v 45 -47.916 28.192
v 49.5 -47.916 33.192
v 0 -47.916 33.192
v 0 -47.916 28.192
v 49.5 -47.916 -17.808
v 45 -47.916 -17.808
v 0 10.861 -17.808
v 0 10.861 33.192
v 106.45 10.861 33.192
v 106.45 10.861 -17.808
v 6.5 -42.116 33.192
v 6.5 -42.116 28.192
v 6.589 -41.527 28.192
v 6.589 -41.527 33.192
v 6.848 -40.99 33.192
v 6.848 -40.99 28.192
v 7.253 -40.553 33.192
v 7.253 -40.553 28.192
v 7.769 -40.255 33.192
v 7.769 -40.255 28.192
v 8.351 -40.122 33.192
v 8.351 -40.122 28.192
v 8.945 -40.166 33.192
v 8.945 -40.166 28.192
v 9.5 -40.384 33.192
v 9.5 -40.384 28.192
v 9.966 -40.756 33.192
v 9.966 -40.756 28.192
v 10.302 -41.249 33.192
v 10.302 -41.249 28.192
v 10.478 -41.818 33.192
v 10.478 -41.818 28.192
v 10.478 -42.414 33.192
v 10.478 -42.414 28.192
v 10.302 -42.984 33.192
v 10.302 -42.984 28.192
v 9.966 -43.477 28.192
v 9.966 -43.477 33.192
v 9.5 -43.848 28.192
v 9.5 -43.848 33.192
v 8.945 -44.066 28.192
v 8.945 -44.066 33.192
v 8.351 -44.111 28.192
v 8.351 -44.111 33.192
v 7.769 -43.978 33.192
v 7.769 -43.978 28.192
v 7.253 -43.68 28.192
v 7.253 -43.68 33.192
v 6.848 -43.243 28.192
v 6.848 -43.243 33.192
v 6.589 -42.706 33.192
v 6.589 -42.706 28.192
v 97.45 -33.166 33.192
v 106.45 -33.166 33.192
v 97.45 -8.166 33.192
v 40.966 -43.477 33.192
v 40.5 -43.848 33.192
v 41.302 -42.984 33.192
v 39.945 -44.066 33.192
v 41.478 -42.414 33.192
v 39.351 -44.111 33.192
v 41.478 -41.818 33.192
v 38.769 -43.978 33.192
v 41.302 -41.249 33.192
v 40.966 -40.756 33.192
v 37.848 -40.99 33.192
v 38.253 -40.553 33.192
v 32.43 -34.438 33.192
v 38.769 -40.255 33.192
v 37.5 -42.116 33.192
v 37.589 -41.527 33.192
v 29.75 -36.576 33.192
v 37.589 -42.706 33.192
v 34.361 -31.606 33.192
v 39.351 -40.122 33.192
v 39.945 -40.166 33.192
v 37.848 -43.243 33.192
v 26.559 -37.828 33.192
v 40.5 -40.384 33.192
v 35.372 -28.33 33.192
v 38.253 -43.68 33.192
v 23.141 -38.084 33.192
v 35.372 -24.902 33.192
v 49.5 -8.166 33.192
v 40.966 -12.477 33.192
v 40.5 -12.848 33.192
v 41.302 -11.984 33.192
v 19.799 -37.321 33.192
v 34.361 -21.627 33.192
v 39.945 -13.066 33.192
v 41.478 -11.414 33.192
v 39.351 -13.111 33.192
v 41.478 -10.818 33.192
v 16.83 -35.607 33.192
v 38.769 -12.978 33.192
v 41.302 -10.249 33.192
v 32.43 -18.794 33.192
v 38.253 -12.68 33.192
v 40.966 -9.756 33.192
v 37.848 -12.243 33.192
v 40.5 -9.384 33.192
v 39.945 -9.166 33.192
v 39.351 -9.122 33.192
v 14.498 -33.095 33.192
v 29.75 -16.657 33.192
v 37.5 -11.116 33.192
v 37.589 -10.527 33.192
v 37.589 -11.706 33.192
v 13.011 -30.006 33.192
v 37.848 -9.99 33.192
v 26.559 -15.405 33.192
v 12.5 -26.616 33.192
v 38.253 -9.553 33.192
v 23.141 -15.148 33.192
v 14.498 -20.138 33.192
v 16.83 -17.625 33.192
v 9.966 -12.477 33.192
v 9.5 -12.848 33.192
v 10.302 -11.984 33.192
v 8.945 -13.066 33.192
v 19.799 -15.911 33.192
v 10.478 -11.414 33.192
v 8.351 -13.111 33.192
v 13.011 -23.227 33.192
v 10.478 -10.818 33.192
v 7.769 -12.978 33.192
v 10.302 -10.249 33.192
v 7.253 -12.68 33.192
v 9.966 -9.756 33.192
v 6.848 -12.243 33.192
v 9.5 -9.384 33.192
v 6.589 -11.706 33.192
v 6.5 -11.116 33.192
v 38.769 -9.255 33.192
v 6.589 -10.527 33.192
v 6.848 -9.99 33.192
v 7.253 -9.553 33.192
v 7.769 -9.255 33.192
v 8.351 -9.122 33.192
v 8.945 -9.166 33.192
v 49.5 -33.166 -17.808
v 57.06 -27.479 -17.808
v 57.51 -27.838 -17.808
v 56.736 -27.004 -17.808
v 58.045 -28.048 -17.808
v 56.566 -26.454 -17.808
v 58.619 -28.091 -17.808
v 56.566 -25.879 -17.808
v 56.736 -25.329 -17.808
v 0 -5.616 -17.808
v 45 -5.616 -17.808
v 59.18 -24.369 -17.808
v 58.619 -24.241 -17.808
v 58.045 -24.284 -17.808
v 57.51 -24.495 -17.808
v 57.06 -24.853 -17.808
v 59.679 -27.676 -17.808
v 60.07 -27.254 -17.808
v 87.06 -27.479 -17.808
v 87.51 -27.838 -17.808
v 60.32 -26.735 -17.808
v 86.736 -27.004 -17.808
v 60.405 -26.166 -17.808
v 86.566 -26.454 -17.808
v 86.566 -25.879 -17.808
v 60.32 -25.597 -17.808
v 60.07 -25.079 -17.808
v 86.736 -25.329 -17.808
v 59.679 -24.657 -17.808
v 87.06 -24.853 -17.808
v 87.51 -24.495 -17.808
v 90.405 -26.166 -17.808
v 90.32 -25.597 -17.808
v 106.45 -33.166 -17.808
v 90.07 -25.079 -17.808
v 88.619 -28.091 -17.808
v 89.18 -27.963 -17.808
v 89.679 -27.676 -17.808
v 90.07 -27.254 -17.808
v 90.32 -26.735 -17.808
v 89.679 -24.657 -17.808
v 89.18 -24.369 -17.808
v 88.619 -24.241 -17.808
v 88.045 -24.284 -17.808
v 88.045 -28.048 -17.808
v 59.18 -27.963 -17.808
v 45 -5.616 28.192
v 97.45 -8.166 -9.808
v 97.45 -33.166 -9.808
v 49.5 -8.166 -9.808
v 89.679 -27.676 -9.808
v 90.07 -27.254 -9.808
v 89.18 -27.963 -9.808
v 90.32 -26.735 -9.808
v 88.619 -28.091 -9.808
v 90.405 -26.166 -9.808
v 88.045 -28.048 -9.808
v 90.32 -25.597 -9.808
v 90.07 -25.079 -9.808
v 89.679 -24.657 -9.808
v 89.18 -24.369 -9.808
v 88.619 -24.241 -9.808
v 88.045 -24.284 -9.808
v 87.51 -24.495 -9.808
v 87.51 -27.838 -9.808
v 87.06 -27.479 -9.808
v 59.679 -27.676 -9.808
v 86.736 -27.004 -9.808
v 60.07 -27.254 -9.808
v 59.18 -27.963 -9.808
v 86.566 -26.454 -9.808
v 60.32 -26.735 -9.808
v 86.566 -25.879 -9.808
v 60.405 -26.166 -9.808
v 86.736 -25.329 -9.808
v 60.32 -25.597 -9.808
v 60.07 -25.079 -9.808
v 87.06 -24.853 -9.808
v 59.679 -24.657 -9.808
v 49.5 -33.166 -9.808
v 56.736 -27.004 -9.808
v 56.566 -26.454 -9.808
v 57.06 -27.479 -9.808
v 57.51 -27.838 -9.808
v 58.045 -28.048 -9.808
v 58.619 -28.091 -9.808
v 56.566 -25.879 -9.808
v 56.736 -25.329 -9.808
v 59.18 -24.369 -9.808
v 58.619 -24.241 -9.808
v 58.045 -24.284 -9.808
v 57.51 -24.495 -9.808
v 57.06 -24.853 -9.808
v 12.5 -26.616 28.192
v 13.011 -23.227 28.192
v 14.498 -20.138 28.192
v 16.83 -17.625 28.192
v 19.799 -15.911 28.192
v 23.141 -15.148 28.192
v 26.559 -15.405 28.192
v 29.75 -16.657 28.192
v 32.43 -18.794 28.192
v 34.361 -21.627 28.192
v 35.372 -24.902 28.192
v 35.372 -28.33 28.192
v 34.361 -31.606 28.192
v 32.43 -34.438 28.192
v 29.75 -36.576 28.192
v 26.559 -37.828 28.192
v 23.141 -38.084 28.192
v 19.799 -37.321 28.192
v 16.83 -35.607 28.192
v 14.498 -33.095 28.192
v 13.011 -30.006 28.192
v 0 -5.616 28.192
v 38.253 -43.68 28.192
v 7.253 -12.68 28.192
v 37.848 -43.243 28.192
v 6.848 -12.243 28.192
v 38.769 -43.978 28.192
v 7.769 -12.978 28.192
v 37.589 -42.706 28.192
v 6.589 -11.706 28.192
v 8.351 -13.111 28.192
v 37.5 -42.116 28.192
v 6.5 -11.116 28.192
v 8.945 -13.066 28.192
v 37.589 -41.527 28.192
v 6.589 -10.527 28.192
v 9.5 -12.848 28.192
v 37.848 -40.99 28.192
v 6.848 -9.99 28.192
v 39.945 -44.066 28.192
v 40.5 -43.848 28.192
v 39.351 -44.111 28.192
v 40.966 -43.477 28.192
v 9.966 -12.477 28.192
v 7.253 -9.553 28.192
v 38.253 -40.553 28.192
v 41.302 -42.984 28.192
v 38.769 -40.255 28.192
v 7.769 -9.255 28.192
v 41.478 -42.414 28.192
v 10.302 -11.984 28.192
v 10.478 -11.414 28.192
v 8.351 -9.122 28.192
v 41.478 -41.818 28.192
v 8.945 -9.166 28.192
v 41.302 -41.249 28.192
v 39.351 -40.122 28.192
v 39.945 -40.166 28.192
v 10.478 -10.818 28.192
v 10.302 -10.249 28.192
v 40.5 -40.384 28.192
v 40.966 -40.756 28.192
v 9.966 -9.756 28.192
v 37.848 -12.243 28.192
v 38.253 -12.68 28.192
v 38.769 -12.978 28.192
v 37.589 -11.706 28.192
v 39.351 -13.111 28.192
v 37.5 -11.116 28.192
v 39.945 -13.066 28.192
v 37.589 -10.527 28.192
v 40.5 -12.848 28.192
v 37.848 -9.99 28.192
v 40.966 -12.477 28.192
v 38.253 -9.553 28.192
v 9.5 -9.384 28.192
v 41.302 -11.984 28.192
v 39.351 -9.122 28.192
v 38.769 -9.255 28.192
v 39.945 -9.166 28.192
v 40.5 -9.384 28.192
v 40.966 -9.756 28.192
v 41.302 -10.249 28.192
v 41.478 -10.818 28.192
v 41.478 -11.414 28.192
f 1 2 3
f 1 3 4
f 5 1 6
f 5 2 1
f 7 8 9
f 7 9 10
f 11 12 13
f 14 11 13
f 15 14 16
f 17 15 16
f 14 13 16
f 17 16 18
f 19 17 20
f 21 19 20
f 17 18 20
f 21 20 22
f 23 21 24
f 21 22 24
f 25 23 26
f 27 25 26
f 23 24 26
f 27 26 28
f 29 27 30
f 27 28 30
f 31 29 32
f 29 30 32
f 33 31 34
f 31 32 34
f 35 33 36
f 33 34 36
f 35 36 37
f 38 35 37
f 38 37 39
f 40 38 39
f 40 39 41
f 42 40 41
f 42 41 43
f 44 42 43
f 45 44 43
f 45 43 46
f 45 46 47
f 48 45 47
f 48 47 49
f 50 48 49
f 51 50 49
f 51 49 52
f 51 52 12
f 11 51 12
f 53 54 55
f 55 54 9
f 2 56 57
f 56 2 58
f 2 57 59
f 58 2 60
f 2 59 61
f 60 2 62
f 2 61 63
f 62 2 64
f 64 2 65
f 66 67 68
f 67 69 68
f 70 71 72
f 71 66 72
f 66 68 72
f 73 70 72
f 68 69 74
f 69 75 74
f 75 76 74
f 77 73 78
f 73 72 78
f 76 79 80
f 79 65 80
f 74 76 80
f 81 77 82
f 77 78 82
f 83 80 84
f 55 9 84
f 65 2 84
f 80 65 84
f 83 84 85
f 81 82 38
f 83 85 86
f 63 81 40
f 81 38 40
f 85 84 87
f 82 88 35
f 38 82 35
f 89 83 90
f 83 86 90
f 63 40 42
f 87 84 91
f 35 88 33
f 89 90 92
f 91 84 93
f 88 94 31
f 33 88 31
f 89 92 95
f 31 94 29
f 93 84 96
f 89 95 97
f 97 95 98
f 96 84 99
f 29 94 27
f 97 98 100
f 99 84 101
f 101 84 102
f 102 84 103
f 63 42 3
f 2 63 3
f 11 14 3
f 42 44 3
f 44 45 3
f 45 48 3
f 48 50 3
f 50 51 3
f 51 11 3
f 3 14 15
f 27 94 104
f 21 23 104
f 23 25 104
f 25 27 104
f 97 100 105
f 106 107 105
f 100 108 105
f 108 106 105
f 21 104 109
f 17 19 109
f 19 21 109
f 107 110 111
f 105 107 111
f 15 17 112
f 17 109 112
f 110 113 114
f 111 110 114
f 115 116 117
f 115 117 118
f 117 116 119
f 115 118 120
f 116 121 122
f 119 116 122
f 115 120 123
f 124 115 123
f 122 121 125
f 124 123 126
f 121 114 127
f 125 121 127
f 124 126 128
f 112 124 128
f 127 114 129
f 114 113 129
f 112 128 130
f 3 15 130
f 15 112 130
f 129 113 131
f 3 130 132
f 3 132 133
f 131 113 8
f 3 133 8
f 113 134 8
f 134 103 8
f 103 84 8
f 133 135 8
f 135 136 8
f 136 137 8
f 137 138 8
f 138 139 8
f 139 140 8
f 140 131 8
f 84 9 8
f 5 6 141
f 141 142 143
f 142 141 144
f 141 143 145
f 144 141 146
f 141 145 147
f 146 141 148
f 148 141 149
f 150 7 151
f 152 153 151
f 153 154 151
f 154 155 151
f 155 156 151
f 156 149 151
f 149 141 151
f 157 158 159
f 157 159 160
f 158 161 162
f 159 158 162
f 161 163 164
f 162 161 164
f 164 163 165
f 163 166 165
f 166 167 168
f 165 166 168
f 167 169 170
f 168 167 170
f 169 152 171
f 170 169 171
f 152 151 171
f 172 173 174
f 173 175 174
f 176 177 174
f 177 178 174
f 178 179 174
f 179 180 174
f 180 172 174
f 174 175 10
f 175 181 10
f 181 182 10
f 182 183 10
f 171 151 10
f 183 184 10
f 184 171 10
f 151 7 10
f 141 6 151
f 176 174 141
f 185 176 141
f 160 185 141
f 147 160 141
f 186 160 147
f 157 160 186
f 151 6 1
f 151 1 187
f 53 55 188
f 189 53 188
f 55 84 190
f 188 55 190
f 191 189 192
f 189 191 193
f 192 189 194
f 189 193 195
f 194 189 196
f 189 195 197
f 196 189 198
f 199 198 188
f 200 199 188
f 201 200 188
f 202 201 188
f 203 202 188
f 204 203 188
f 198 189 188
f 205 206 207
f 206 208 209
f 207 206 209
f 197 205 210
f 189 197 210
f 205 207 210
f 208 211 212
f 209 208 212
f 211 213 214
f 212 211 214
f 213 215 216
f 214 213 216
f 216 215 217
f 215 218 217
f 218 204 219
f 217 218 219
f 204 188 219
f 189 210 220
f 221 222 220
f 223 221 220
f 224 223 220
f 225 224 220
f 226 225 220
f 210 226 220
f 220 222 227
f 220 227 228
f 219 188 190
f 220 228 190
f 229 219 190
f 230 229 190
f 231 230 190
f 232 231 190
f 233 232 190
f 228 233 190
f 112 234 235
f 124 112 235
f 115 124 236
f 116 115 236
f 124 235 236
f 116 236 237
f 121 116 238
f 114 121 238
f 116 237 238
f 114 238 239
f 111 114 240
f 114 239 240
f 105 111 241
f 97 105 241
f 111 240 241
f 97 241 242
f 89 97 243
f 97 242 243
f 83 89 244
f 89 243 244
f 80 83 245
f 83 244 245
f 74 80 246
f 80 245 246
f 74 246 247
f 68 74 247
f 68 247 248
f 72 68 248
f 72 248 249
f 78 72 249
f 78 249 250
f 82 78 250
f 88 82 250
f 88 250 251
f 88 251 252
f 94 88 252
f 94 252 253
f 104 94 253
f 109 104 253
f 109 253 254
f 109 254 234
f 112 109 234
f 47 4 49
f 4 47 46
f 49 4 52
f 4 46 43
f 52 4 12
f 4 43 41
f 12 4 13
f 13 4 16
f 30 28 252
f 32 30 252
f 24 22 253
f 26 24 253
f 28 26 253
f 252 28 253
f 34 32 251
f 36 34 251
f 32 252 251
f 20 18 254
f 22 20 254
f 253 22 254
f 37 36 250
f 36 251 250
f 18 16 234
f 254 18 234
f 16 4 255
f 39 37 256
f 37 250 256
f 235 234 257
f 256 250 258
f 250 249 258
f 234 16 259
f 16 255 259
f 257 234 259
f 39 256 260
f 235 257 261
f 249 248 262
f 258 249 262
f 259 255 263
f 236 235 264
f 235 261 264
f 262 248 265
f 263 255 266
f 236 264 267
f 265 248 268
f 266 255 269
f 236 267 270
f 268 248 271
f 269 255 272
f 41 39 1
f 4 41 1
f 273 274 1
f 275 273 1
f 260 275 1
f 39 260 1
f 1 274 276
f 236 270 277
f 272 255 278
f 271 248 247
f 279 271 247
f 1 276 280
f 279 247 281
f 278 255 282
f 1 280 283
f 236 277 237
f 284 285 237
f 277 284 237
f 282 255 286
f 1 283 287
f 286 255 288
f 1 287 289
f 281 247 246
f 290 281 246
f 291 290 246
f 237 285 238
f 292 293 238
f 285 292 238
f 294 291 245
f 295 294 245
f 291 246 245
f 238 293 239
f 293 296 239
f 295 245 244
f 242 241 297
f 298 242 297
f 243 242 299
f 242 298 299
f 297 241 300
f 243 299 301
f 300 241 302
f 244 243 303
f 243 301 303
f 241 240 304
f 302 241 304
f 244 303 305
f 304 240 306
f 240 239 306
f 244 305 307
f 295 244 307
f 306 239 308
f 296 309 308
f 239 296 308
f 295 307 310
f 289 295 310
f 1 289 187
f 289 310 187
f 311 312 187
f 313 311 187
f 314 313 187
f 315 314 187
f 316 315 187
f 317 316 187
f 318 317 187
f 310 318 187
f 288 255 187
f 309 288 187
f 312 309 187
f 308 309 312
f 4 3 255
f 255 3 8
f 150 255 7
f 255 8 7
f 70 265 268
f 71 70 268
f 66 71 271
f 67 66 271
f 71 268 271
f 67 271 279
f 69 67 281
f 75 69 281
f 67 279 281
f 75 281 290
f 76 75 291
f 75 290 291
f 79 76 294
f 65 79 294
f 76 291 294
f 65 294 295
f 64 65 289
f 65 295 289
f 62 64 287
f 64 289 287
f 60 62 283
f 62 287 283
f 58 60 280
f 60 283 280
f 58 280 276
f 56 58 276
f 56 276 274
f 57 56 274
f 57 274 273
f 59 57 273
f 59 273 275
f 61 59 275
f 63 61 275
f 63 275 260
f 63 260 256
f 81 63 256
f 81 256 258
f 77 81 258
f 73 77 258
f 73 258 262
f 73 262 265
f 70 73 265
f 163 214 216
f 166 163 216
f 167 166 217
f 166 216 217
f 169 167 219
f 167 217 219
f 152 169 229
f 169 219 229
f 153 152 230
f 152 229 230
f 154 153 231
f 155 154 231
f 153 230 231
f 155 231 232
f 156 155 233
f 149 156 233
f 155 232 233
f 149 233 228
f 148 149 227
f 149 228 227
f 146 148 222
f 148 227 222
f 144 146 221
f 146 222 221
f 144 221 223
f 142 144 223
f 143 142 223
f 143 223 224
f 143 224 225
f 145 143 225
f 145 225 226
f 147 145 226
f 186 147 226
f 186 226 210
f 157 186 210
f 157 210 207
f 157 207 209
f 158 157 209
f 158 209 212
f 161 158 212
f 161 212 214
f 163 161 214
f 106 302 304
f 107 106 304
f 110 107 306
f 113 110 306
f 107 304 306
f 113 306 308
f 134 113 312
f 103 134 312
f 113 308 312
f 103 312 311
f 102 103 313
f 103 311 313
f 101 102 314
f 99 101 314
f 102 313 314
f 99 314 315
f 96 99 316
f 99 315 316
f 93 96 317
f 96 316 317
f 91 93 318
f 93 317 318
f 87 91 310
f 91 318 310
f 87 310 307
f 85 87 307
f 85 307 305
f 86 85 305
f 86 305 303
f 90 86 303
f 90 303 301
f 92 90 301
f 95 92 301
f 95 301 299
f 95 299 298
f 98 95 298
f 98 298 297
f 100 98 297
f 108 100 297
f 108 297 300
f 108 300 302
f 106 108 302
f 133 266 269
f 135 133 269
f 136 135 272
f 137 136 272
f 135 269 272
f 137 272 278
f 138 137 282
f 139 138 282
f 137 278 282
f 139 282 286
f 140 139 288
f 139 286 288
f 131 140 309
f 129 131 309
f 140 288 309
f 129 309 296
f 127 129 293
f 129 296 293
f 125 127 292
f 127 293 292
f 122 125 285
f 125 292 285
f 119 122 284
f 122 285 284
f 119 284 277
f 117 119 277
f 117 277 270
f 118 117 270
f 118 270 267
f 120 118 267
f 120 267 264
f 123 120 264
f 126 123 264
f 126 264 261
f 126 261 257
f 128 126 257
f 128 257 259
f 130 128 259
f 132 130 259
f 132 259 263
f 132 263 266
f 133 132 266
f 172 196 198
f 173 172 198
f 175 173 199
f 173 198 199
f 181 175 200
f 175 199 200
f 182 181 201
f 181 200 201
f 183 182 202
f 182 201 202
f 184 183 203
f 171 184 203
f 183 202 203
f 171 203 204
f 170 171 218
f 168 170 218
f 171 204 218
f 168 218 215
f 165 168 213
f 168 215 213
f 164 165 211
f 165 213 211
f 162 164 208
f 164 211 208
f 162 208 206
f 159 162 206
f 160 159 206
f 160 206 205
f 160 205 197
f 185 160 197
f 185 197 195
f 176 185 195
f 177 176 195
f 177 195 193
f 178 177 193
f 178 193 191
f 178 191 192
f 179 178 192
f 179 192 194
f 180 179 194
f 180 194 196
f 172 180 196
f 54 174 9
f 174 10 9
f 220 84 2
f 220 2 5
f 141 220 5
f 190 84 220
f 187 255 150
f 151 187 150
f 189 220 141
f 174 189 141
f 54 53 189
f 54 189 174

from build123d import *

# Parameters (mm, degrees)
SKETCH1_W            = 48
SKETCH1_H            = 53
BOSS_EXTRUDE1_DEPTH  = 10
SKETCH2_W            = 48
SKETCH2_H            = 5.616325
BOSS_EXTRUDE2_DEPTH  = 33.1917878
SKETCH4_W            = 4
SKETCH4_H            = 10
BOSS_EXTRUDE4_DEPTH  = 40
SKETCH5_W            = 48
SKETCH5_H            = 10.8609375
BOSS_EXTRUDE5_DEPTH  = 23.1917878
SKETCH6_W            = 48
SKETCH6_H            = 5
BOSS_EXTRUDE6_DEPTH  = 42.3
SKETCH7_W            = 12.8082122
SKETCH7_H            = 16.4772625
BOSS_EXTRUDE7_DEPTH  = 48
CUT_EXTRUDE1_REACH   = 84.426
SKETCH8_R            = 11.5
SKETCH8_R_2          = 2
FILLET1_R            = 10
FILLET2_R            = 4
SKETCH9_W            = 5
SKETCH9_H            = 16.4772625
BOSS_EXTRUDE9_DEPTH  = 48
CUT_EXTRUDE2_DEPTH   = 88.252507127
SKETCH11_W           = 51
SKETCH11_H           = 16.4772625
BOSS_EXTRUDE10_DEPTH = 49.45
BOSS_EXTRUDE11_DEPTH = 46
SKETCH16_W           = 47.95
SKETCH16_H           = 51
BOSS_EXTRUDE14_DEPTH = 2.55
SKETCH14_W           = 5
SKETCH14_H           = 42.3
BOSS_EXTRUDE13_DEPTH = 1.5
SKETCH17_W           = 51
SKETCH17_H           = 19.0272625
BOSS_EXTRUDE15_DEPTH = 9
BOSS_EXTRUDE16_DEPTH = 25
SKETCH19_R           = 1.9304
CUT_EXTRUDE3_DEPTH   = 125.404890183


with BuildPart() as part:
    # Sketch1 → Boss-Extrude1 (new body)
    with BuildSketch(Plane.XY):
        with Locations((24, 26.5)):
            Rectangle(SKETCH1_W, SKETCH1_H)
    extrude(amount=BOSS_EXTRUDE1_DEPTH)

    # Sketch2 → Boss-Extrude2 (add)
    with BuildSketch(Plane(origin=(0, 0, 0), x_dir=(-1, 0, 0), z_dir=(0, 0, -1))):
        with Locations((-24, -2.8081625)):
            Rectangle(SKETCH2_W, SKETCH2_H)
    extrude(amount=-BOSS_EXTRUDE2_DEPTH)

    # Sketch4 → Boss-Extrude4 (add)
    with BuildSketch(Plane.XY.offset(10)):
        with Locations((2, 48)):
            Rectangle(SKETCH4_W, SKETCH4_H)
        with Locations((46, 48)):
            Rectangle(SKETCH4_W, SKETCH4_H)
    extrude(amount=BOSS_EXTRUDE4_DEPTH)

    # Sketch5 → Boss-Extrude5 (add)
    with BuildSketch(Plane.XY.offset(10)):
        with Locations((24, 5.43046875)):
            Rectangle(SKETCH5_W, SKETCH5_H)
    extrude(amount=BOSS_EXTRUDE5_DEPTH)

    # Sketch6 → Boss-Extrude6 (add)
    with BuildSketch(Plane.XZ.offset(5.616325)):
        with Locations((24, 30.6917878)):
            Rectangle(SKETCH6_W, SKETCH6_H)
    extrude(amount=BOSS_EXTRUDE6_DEPTH)

    # Sketch7 → Boss-Extrude7 (add)
    with BuildSketch(Plane.ZY):
        with Locations((-6.4041061, 2.62230625)):
            Rectangle(SKETCH7_W, SKETCH7_H)
    extrude(amount=-BOSS_EXTRUDE7_DEPTH)

    # Sketch8 → Cut-Extrude1 (cut, up to next)
    with BuildSketch(Plane(origin=(0, 0, 28.1917878), x_dir=(-1, 0, 0), z_dir=(0, 0, -1)), mode=Mode.PRIVATE) as cut_extrude1_sk1:
        with Locations((-24, -26.616325)):
            Circle(SKETCH8_R)
    cut_extrude1_tool1 = extrude(cut_extrude1_sk1.sketch, amount=-CUT_EXTRUDE1_REACH, mode=Mode.PRIVATE) & part.part
    # Sketch8 → Cut-Extrude1 (cut, up to next)
    with BuildSketch(Plane(origin=(0, 0, 28.1917878), x_dir=(-1, 0, 0), z_dir=(0, 0, -1)), mode=Mode.PRIVATE) as cut_extrude1_sk2:
        with Locations((-39.5, -11.116325)):
            Circle(SKETCH8_R_2)
    cut_extrude1_tool2 = extrude(cut_extrude1_sk2.sketch, amount=-CUT_EXTRUDE1_REACH, mode=Mode.PRIVATE) & part.part
    # Sketch8 → Cut-Extrude1 (cut, up to next)
    with BuildSketch(Plane(origin=(0, 0, 28.1917878), x_dir=(-1, 0, 0), z_dir=(0, 0, -1)), mode=Mode.PRIVATE) as cut_extrude1_sk3:
        with Locations((-39.5, -42.116325)):
            Circle(SKETCH8_R_2)
    cut_extrude1_tool3 = extrude(cut_extrude1_sk3.sketch, amount=-CUT_EXTRUDE1_REACH, mode=Mode.PRIVATE) & part.part
    # Sketch8 → Cut-Extrude1 (cut, up to next)
    with BuildSketch(Plane(origin=(0, 0, 28.1917878), x_dir=(-1, 0, 0), z_dir=(0, 0, -1)), mode=Mode.PRIVATE) as cut_extrude1_sk4:
        with Locations((-8.5, -11.116325)):
            Circle(SKETCH8_R_2)
    cut_extrude1_tool4 = extrude(cut_extrude1_sk4.sketch, amount=-CUT_EXTRUDE1_REACH, mode=Mode.PRIVATE) & part.part
    # Sketch8 → Cut-Extrude1 (cut, up to next)
    with BuildSketch(Plane(origin=(0, 0, 28.1917878), x_dir=(-1, 0, 0), z_dir=(0, 0, -1)), mode=Mode.PRIVATE) as cut_extrude1_sk5:
        with Locations((-8.5, -42.116325)):
            Circle(SKETCH8_R_2)
    cut_extrude1_tool5 = extrude(cut_extrude1_sk5.sketch, amount=-CUT_EXTRUDE1_REACH, mode=Mode.PRIVATE) & part.part
    add(cut_extrude1_tool1.solids().sort_by_distance((24, -26.616325, 28.191788))[0], mode=Mode.SUBTRACT)
    add(cut_extrude1_tool2.solids().sort_by_distance((39.5, -11.116325, 28.191788))[0], mode=Mode.SUBTRACT)
    add(cut_extrude1_tool3.solids().sort_by_distance((39.5, -42.116325, 28.191788))[0], mode=Mode.SUBTRACT)
    add(cut_extrude1_tool4.solids().sort_by_distance((8.5, -11.116325, 28.191788))[0], mode=Mode.SUBTRACT)
    add(cut_extrude1_tool5.solids().sort_by_distance((8.5, -42.116325, 28.191788))[0], mode=Mode.SUBTRACT)

    # Fillet1
    fillet1_edges = [part.edges().sort_by_distance(p)[0] for p in [
        (24, 10.8609375, 0),
    ]]
    fillet(fillet1_edges, radius=FILLET1_R)

    # Fillet2
    fillet2_edges = [part.edges().sort_by_distance(p)[0] for p in [
        (2, 43, 10),
        (46, 43, 10),
    ]]
    fillet(fillet2_edges, radius=FILLET2_R)

    # Sketch9 → Boss-Extrude9 (add)
    with BuildSketch(Plane(origin=(48, 0, 0), x_dir=(0, 0, -1), z_dir=(1, 0, 0))):
        with Locations((15.3082122, 2.62230625)):
            Rectangle(SKETCH9_W, SKETCH9_H)
    extrude(amount=-BOSS_EXTRUDE9_DEPTH)

    # Sketch10 → Cut-Extrude2 (cut, through all)
    with BuildSketch(Plane(origin=(48, 0, 0), x_dir=(0, 0, -1), z_dir=(1, 0, 0))):
        Polygon((17.8082122, 10.8609375), (-33.1917878, 10.8609375), (-76.887145623, 43.902095521), (-50.794096938, 74.436514195), (27.207463492, 71.105486703), align=None)
    extrude(amount=-CUT_EXTRUDE2_DEPTH, mode=Mode.SUBTRACT)

    # Sketch11 → Boss-Extrude10 (add)
    with BuildSketch(Plane(origin=(48, 0, 0), x_dir=(0, 0, -1), z_dir=(1, 0, 0))):
        with Locations((-7.6917878, 2.62230625)):
            Rectangle(SKETCH11_W, SKETCH11_H)
    extrude(amount=BOSS_EXTRUDE10_DEPTH)

    # Sketch12 → Boss-Extrude11 (add)
    with BuildSketch(Plane(origin=(0, 0, 28.1917878), x_dir=(-1, 0, 0), z_dir=(0, 0, -1))):
        Polygon((-48, -47.916325), (-45, -47.916325), (-45, -5.616325), (-49.5, -5.616325), (-49.5, -47.916325), align=None)
    extrude(amount=BOSS_EXTRUDE11_DEPTH)

    # Sketch16 → Boss-Extrude14 (add)
    with BuildSketch(Plane.XZ.offset(5.616325)):
        with Locations((73.475, 7.6917878)):
            Rectangle(SKETCH16_W, SKETCH16_H)
    extrude(amount=BOSS_EXTRUDE14_DEPTH)

    # Sketch14 → Boss-Extrude13 (add)
    with BuildSketch(Plane(origin=(49.5, 0, 0), x_dir=(0, 0, -1), z_dir=(1, 0, 0))):
        with Locations((-30.6917878, -26.766325)):
            Rectangle(SKETCH14_W, SKETCH14_H)
    extrude(amount=-BOSS_EXTRUDE13_DEPTH)

    # Sketch17 → Boss-Extrude15 (add)
    with BuildSketch(Plane(origin=(97.45, 0, 0), x_dir=(0, 0, -1), z_dir=(1, 0, 0))):
        with Locations((-7.6917878, 1.34730625)):
            Rectangle(SKETCH17_W, SKETCH17_H)
    extrude(amount=BOSS_EXTRUDE15_DEPTH)

    # Sketch18 → Boss-Extrude16 (add)
    with BuildSketch(Plane.XZ.offset(8.166325)):
        Polygon((49.5, -17.8082122), (106.45, -17.8082122), (106.45, -9.8082122), (106.45, 33.1917878), (97.45, 33.1917878), (97.45, -9.8082122), (49.5, -9.8082122), align=None)
    extrude(amount=BOSS_EXTRUDE16_DEPTH)

    # Sketch19 → Cut-Extrude3 (cut, through all)
    with BuildSketch(Plane.XY.offset(-9.8082122)):
        with Locations((58.475, -26.166325)):
            Circle(SKETCH19_R)
        with Locations((88.475, -26.166325)):
            Circle(SKETCH19_R)
    extrude(amount=-CUT_EXTRUDE3_DEPTH, mode=Mode.SUBTRACT)


solid = part.part
